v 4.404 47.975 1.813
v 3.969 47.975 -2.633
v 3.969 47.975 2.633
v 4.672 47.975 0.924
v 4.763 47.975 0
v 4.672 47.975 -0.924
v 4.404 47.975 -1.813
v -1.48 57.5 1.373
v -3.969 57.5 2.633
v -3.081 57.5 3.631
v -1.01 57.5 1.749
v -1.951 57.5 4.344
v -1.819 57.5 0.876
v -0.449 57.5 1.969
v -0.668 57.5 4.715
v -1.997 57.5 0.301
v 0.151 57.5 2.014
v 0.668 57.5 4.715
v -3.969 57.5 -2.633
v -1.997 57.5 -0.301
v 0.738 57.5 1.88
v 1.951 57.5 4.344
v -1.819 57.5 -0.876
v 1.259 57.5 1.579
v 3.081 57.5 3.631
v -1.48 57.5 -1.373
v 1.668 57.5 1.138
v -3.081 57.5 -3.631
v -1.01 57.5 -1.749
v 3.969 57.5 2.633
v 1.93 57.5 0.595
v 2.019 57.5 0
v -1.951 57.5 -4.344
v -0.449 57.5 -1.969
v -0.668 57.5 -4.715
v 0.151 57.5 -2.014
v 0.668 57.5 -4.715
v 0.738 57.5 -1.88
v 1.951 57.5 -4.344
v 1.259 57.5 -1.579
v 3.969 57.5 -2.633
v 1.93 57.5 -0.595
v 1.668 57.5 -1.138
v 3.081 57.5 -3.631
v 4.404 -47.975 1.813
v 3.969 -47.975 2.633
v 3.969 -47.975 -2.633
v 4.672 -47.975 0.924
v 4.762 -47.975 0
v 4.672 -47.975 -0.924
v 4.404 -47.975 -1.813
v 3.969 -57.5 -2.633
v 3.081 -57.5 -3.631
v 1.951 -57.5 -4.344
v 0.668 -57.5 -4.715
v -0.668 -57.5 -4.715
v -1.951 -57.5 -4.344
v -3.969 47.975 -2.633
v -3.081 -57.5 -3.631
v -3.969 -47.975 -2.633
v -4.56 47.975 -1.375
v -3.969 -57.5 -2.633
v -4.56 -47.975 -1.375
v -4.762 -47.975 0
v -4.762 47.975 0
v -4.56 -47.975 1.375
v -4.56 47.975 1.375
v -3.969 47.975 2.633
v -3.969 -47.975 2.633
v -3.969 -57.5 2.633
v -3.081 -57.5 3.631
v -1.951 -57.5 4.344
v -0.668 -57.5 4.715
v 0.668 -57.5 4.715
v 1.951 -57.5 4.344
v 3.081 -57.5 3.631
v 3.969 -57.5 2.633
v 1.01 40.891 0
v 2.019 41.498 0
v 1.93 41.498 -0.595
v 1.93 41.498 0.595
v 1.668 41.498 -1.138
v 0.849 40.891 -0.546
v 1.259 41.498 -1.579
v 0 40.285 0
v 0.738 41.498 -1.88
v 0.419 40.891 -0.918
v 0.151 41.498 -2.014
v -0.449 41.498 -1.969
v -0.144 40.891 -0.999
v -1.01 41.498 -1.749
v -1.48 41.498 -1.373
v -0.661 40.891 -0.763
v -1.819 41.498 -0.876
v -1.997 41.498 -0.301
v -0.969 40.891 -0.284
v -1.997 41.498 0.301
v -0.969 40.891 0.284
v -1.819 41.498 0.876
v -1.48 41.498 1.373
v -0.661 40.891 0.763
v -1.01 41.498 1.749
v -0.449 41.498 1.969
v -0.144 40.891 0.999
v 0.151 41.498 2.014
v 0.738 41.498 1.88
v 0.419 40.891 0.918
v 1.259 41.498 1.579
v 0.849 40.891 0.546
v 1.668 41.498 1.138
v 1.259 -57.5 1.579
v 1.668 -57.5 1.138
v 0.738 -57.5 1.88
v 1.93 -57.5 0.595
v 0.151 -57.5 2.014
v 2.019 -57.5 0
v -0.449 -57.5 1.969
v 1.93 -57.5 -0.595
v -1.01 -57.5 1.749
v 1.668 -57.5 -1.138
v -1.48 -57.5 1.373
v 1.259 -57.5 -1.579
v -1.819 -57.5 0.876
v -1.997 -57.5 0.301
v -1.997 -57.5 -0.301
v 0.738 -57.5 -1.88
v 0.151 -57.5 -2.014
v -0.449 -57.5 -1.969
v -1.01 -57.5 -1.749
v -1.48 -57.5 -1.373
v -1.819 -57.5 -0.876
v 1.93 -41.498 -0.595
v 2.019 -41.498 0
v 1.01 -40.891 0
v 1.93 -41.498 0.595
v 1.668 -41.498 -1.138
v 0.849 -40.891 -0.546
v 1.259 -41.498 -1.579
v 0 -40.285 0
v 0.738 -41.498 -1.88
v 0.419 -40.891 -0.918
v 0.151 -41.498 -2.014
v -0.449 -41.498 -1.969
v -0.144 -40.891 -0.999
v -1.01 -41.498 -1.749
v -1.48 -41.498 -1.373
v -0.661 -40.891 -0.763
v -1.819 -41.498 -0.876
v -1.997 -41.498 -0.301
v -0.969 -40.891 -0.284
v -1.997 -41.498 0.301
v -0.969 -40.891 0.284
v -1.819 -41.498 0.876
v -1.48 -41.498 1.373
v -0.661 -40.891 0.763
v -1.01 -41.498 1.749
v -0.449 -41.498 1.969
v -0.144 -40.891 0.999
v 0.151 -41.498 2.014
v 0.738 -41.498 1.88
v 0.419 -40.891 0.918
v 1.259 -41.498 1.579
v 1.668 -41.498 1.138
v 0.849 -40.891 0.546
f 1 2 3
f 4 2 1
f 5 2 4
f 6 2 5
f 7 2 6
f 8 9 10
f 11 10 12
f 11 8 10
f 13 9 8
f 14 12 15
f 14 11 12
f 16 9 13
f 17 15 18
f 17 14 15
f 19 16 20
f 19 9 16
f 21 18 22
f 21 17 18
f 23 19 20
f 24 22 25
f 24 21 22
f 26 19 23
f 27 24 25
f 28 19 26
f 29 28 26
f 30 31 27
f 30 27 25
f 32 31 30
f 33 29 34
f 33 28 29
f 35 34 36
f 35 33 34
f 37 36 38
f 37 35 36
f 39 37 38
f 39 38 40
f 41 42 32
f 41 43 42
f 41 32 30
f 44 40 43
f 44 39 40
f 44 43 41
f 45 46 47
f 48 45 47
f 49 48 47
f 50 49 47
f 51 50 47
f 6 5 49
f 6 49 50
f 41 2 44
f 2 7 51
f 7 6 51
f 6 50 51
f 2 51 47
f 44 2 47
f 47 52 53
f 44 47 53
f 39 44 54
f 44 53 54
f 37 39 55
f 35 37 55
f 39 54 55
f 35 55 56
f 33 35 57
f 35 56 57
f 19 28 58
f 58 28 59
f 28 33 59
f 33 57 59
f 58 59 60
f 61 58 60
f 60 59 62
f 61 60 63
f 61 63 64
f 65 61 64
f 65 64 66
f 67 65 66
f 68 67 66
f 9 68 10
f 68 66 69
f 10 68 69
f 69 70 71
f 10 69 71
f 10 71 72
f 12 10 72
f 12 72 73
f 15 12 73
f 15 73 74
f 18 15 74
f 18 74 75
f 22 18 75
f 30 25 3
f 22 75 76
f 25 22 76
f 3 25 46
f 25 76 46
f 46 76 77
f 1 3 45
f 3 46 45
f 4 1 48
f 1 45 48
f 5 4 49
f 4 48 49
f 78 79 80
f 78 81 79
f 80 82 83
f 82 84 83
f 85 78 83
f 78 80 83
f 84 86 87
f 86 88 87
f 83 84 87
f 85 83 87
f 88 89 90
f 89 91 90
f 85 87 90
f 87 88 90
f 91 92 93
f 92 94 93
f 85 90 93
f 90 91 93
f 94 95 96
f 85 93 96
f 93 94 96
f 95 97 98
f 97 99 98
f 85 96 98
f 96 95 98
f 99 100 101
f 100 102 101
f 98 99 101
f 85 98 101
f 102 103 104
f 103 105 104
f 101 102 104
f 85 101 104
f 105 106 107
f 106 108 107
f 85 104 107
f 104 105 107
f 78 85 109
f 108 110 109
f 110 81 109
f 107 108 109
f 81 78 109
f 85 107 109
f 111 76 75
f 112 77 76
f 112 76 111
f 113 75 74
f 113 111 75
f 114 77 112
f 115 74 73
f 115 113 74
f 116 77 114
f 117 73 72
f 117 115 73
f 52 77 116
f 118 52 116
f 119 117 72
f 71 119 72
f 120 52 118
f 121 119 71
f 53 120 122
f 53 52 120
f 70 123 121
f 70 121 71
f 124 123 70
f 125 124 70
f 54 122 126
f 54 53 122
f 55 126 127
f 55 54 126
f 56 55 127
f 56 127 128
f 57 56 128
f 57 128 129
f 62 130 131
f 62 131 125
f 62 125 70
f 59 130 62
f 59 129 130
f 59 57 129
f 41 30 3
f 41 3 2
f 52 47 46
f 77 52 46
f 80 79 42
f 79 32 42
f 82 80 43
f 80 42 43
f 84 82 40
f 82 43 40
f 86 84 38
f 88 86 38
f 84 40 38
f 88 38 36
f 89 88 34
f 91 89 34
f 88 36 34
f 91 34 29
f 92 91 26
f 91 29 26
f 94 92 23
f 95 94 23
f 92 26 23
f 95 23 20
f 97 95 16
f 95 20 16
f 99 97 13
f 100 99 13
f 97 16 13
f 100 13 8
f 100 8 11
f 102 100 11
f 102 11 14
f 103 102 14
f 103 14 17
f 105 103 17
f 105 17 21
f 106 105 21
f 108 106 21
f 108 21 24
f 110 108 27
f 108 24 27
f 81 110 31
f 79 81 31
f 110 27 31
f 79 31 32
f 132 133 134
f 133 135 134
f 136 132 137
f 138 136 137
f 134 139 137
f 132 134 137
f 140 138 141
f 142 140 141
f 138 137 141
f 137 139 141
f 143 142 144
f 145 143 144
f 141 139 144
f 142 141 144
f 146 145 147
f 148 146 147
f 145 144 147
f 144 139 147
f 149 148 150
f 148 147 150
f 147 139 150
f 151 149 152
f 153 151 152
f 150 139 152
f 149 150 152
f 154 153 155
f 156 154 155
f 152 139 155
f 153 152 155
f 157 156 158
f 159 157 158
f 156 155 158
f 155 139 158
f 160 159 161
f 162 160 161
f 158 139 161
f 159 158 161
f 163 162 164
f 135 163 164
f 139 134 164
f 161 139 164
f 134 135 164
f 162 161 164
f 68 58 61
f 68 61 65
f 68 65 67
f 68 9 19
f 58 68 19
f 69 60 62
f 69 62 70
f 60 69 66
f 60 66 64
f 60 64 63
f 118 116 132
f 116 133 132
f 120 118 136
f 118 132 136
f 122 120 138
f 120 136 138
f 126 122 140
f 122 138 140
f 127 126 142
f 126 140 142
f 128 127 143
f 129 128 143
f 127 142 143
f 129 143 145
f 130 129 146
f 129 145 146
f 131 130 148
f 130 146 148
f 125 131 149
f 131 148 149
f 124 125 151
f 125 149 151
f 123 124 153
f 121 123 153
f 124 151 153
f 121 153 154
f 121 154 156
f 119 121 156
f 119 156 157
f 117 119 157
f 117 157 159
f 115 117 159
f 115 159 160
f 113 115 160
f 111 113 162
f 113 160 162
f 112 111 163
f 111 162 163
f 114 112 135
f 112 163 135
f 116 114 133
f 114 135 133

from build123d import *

# Parameters (mm, degrees)
SKETCH1_W          = 1.5875
SKETCH1_H          = 76.9
CUT_EXTRUDE3_START = -9.525
CUT_EXTRUDE3_DEPTH = 9.525
CUT_EXTRUDE4_DEPTH = 9.525


# Read off the part's stored shape, not the designer's step: Tap Drill for #10-32 Tap1
with BuildPart() as part:
    # Sketch1 → Revolve1 (revolve)
    with BuildSketch(Plane.XY, mode=Mode.PRIVATE) as revolve1_sk:
        with Locations((-3.96875, 0)):
            Rectangle(SKETCH1_W, SKETCH1_H)
        Polygon((0, -57.5), (-4.7625, -57.5), (-4.7625, -38.45), (-3.175, -38.45), (-3.175, 38.45), (-4.7625, 38.45), (-4.7625, 57.5), (0, 57.5), align=None)
    revolve(revolve1_sk.sketch.rotate(Axis((0, -57.5, 0), (0, 1, 0)), 180), axis=Axis((0, -57.5, 0), (0, 1, 0)))

    # Sketch2 → Cut-Extrude3 (cut)
    with BuildSketch(Plane.XZ.offset(57.5).offset(CUT_EXTRUDE3_START)):
        with BuildLine():
            Line((-3.96875, -2.632570927), (-3.96875, 2.632570927))
            ThreePointArc((-3.96875, 2.632570927), (-4.7625, 0), (-3.96875, -2.632570927))
        make_face()
        with BuildLine():
            Line((3.96875, -2.632570927), (3.96875, 2.632570927))
            ThreePointArc((3.96875, 2.632570927), (4.7625, 0), (3.96875, -2.632570927))
        make_face()
    extrude(amount=CUT_EXTRUDE3_DEPTH, mode=Mode.SUBTRACT)

    # Sketch5 → Cut-Extrude4 (cut)
    with BuildSketch(Plane(origin=(0, 57.5, 0), x_dir=(1, 0, 0), z_dir=(0, 1, 0))):
        with BuildLine():
            Line((-3.96875, -2.632570927), (-3.96875, 2.632570927))
            ThreePointArc((-3.96875, 2.632570927), (-4.7625, 0), (-3.96875, -2.632570927))
        make_face()
        with BuildLine():
            Line((3.96875, -2.632570927), (3.96875, 2.632570927))
            ThreePointArc((3.96875, 2.632570927), (4.7625, 0), (3.96875, -2.632570927))
        make_face()
    extrude(amount=-CUT_EXTRUDE4_DEPTH, mode=Mode.SUBTRACT)

    # Tap Drill for #10-32 Tap1 outline → Tap Drill for #10-32 Tap1 (revolve, cut)
    with BuildSketch(Plane.XY):
        Polygon((0, 57.5), (0, 40.284682152), (2.0193, 41.498), (2.0193, 57.5), align=None)
        Polygon((2.0193, -41.498), (0, -40.284682152), (0, -57.5), (2.0193, -57.5), align=None)
    revolve(axis=Axis((0, 0, 0), (0, 1, 0)), mode=Mode.SUBTRACT)


solid = part.part
